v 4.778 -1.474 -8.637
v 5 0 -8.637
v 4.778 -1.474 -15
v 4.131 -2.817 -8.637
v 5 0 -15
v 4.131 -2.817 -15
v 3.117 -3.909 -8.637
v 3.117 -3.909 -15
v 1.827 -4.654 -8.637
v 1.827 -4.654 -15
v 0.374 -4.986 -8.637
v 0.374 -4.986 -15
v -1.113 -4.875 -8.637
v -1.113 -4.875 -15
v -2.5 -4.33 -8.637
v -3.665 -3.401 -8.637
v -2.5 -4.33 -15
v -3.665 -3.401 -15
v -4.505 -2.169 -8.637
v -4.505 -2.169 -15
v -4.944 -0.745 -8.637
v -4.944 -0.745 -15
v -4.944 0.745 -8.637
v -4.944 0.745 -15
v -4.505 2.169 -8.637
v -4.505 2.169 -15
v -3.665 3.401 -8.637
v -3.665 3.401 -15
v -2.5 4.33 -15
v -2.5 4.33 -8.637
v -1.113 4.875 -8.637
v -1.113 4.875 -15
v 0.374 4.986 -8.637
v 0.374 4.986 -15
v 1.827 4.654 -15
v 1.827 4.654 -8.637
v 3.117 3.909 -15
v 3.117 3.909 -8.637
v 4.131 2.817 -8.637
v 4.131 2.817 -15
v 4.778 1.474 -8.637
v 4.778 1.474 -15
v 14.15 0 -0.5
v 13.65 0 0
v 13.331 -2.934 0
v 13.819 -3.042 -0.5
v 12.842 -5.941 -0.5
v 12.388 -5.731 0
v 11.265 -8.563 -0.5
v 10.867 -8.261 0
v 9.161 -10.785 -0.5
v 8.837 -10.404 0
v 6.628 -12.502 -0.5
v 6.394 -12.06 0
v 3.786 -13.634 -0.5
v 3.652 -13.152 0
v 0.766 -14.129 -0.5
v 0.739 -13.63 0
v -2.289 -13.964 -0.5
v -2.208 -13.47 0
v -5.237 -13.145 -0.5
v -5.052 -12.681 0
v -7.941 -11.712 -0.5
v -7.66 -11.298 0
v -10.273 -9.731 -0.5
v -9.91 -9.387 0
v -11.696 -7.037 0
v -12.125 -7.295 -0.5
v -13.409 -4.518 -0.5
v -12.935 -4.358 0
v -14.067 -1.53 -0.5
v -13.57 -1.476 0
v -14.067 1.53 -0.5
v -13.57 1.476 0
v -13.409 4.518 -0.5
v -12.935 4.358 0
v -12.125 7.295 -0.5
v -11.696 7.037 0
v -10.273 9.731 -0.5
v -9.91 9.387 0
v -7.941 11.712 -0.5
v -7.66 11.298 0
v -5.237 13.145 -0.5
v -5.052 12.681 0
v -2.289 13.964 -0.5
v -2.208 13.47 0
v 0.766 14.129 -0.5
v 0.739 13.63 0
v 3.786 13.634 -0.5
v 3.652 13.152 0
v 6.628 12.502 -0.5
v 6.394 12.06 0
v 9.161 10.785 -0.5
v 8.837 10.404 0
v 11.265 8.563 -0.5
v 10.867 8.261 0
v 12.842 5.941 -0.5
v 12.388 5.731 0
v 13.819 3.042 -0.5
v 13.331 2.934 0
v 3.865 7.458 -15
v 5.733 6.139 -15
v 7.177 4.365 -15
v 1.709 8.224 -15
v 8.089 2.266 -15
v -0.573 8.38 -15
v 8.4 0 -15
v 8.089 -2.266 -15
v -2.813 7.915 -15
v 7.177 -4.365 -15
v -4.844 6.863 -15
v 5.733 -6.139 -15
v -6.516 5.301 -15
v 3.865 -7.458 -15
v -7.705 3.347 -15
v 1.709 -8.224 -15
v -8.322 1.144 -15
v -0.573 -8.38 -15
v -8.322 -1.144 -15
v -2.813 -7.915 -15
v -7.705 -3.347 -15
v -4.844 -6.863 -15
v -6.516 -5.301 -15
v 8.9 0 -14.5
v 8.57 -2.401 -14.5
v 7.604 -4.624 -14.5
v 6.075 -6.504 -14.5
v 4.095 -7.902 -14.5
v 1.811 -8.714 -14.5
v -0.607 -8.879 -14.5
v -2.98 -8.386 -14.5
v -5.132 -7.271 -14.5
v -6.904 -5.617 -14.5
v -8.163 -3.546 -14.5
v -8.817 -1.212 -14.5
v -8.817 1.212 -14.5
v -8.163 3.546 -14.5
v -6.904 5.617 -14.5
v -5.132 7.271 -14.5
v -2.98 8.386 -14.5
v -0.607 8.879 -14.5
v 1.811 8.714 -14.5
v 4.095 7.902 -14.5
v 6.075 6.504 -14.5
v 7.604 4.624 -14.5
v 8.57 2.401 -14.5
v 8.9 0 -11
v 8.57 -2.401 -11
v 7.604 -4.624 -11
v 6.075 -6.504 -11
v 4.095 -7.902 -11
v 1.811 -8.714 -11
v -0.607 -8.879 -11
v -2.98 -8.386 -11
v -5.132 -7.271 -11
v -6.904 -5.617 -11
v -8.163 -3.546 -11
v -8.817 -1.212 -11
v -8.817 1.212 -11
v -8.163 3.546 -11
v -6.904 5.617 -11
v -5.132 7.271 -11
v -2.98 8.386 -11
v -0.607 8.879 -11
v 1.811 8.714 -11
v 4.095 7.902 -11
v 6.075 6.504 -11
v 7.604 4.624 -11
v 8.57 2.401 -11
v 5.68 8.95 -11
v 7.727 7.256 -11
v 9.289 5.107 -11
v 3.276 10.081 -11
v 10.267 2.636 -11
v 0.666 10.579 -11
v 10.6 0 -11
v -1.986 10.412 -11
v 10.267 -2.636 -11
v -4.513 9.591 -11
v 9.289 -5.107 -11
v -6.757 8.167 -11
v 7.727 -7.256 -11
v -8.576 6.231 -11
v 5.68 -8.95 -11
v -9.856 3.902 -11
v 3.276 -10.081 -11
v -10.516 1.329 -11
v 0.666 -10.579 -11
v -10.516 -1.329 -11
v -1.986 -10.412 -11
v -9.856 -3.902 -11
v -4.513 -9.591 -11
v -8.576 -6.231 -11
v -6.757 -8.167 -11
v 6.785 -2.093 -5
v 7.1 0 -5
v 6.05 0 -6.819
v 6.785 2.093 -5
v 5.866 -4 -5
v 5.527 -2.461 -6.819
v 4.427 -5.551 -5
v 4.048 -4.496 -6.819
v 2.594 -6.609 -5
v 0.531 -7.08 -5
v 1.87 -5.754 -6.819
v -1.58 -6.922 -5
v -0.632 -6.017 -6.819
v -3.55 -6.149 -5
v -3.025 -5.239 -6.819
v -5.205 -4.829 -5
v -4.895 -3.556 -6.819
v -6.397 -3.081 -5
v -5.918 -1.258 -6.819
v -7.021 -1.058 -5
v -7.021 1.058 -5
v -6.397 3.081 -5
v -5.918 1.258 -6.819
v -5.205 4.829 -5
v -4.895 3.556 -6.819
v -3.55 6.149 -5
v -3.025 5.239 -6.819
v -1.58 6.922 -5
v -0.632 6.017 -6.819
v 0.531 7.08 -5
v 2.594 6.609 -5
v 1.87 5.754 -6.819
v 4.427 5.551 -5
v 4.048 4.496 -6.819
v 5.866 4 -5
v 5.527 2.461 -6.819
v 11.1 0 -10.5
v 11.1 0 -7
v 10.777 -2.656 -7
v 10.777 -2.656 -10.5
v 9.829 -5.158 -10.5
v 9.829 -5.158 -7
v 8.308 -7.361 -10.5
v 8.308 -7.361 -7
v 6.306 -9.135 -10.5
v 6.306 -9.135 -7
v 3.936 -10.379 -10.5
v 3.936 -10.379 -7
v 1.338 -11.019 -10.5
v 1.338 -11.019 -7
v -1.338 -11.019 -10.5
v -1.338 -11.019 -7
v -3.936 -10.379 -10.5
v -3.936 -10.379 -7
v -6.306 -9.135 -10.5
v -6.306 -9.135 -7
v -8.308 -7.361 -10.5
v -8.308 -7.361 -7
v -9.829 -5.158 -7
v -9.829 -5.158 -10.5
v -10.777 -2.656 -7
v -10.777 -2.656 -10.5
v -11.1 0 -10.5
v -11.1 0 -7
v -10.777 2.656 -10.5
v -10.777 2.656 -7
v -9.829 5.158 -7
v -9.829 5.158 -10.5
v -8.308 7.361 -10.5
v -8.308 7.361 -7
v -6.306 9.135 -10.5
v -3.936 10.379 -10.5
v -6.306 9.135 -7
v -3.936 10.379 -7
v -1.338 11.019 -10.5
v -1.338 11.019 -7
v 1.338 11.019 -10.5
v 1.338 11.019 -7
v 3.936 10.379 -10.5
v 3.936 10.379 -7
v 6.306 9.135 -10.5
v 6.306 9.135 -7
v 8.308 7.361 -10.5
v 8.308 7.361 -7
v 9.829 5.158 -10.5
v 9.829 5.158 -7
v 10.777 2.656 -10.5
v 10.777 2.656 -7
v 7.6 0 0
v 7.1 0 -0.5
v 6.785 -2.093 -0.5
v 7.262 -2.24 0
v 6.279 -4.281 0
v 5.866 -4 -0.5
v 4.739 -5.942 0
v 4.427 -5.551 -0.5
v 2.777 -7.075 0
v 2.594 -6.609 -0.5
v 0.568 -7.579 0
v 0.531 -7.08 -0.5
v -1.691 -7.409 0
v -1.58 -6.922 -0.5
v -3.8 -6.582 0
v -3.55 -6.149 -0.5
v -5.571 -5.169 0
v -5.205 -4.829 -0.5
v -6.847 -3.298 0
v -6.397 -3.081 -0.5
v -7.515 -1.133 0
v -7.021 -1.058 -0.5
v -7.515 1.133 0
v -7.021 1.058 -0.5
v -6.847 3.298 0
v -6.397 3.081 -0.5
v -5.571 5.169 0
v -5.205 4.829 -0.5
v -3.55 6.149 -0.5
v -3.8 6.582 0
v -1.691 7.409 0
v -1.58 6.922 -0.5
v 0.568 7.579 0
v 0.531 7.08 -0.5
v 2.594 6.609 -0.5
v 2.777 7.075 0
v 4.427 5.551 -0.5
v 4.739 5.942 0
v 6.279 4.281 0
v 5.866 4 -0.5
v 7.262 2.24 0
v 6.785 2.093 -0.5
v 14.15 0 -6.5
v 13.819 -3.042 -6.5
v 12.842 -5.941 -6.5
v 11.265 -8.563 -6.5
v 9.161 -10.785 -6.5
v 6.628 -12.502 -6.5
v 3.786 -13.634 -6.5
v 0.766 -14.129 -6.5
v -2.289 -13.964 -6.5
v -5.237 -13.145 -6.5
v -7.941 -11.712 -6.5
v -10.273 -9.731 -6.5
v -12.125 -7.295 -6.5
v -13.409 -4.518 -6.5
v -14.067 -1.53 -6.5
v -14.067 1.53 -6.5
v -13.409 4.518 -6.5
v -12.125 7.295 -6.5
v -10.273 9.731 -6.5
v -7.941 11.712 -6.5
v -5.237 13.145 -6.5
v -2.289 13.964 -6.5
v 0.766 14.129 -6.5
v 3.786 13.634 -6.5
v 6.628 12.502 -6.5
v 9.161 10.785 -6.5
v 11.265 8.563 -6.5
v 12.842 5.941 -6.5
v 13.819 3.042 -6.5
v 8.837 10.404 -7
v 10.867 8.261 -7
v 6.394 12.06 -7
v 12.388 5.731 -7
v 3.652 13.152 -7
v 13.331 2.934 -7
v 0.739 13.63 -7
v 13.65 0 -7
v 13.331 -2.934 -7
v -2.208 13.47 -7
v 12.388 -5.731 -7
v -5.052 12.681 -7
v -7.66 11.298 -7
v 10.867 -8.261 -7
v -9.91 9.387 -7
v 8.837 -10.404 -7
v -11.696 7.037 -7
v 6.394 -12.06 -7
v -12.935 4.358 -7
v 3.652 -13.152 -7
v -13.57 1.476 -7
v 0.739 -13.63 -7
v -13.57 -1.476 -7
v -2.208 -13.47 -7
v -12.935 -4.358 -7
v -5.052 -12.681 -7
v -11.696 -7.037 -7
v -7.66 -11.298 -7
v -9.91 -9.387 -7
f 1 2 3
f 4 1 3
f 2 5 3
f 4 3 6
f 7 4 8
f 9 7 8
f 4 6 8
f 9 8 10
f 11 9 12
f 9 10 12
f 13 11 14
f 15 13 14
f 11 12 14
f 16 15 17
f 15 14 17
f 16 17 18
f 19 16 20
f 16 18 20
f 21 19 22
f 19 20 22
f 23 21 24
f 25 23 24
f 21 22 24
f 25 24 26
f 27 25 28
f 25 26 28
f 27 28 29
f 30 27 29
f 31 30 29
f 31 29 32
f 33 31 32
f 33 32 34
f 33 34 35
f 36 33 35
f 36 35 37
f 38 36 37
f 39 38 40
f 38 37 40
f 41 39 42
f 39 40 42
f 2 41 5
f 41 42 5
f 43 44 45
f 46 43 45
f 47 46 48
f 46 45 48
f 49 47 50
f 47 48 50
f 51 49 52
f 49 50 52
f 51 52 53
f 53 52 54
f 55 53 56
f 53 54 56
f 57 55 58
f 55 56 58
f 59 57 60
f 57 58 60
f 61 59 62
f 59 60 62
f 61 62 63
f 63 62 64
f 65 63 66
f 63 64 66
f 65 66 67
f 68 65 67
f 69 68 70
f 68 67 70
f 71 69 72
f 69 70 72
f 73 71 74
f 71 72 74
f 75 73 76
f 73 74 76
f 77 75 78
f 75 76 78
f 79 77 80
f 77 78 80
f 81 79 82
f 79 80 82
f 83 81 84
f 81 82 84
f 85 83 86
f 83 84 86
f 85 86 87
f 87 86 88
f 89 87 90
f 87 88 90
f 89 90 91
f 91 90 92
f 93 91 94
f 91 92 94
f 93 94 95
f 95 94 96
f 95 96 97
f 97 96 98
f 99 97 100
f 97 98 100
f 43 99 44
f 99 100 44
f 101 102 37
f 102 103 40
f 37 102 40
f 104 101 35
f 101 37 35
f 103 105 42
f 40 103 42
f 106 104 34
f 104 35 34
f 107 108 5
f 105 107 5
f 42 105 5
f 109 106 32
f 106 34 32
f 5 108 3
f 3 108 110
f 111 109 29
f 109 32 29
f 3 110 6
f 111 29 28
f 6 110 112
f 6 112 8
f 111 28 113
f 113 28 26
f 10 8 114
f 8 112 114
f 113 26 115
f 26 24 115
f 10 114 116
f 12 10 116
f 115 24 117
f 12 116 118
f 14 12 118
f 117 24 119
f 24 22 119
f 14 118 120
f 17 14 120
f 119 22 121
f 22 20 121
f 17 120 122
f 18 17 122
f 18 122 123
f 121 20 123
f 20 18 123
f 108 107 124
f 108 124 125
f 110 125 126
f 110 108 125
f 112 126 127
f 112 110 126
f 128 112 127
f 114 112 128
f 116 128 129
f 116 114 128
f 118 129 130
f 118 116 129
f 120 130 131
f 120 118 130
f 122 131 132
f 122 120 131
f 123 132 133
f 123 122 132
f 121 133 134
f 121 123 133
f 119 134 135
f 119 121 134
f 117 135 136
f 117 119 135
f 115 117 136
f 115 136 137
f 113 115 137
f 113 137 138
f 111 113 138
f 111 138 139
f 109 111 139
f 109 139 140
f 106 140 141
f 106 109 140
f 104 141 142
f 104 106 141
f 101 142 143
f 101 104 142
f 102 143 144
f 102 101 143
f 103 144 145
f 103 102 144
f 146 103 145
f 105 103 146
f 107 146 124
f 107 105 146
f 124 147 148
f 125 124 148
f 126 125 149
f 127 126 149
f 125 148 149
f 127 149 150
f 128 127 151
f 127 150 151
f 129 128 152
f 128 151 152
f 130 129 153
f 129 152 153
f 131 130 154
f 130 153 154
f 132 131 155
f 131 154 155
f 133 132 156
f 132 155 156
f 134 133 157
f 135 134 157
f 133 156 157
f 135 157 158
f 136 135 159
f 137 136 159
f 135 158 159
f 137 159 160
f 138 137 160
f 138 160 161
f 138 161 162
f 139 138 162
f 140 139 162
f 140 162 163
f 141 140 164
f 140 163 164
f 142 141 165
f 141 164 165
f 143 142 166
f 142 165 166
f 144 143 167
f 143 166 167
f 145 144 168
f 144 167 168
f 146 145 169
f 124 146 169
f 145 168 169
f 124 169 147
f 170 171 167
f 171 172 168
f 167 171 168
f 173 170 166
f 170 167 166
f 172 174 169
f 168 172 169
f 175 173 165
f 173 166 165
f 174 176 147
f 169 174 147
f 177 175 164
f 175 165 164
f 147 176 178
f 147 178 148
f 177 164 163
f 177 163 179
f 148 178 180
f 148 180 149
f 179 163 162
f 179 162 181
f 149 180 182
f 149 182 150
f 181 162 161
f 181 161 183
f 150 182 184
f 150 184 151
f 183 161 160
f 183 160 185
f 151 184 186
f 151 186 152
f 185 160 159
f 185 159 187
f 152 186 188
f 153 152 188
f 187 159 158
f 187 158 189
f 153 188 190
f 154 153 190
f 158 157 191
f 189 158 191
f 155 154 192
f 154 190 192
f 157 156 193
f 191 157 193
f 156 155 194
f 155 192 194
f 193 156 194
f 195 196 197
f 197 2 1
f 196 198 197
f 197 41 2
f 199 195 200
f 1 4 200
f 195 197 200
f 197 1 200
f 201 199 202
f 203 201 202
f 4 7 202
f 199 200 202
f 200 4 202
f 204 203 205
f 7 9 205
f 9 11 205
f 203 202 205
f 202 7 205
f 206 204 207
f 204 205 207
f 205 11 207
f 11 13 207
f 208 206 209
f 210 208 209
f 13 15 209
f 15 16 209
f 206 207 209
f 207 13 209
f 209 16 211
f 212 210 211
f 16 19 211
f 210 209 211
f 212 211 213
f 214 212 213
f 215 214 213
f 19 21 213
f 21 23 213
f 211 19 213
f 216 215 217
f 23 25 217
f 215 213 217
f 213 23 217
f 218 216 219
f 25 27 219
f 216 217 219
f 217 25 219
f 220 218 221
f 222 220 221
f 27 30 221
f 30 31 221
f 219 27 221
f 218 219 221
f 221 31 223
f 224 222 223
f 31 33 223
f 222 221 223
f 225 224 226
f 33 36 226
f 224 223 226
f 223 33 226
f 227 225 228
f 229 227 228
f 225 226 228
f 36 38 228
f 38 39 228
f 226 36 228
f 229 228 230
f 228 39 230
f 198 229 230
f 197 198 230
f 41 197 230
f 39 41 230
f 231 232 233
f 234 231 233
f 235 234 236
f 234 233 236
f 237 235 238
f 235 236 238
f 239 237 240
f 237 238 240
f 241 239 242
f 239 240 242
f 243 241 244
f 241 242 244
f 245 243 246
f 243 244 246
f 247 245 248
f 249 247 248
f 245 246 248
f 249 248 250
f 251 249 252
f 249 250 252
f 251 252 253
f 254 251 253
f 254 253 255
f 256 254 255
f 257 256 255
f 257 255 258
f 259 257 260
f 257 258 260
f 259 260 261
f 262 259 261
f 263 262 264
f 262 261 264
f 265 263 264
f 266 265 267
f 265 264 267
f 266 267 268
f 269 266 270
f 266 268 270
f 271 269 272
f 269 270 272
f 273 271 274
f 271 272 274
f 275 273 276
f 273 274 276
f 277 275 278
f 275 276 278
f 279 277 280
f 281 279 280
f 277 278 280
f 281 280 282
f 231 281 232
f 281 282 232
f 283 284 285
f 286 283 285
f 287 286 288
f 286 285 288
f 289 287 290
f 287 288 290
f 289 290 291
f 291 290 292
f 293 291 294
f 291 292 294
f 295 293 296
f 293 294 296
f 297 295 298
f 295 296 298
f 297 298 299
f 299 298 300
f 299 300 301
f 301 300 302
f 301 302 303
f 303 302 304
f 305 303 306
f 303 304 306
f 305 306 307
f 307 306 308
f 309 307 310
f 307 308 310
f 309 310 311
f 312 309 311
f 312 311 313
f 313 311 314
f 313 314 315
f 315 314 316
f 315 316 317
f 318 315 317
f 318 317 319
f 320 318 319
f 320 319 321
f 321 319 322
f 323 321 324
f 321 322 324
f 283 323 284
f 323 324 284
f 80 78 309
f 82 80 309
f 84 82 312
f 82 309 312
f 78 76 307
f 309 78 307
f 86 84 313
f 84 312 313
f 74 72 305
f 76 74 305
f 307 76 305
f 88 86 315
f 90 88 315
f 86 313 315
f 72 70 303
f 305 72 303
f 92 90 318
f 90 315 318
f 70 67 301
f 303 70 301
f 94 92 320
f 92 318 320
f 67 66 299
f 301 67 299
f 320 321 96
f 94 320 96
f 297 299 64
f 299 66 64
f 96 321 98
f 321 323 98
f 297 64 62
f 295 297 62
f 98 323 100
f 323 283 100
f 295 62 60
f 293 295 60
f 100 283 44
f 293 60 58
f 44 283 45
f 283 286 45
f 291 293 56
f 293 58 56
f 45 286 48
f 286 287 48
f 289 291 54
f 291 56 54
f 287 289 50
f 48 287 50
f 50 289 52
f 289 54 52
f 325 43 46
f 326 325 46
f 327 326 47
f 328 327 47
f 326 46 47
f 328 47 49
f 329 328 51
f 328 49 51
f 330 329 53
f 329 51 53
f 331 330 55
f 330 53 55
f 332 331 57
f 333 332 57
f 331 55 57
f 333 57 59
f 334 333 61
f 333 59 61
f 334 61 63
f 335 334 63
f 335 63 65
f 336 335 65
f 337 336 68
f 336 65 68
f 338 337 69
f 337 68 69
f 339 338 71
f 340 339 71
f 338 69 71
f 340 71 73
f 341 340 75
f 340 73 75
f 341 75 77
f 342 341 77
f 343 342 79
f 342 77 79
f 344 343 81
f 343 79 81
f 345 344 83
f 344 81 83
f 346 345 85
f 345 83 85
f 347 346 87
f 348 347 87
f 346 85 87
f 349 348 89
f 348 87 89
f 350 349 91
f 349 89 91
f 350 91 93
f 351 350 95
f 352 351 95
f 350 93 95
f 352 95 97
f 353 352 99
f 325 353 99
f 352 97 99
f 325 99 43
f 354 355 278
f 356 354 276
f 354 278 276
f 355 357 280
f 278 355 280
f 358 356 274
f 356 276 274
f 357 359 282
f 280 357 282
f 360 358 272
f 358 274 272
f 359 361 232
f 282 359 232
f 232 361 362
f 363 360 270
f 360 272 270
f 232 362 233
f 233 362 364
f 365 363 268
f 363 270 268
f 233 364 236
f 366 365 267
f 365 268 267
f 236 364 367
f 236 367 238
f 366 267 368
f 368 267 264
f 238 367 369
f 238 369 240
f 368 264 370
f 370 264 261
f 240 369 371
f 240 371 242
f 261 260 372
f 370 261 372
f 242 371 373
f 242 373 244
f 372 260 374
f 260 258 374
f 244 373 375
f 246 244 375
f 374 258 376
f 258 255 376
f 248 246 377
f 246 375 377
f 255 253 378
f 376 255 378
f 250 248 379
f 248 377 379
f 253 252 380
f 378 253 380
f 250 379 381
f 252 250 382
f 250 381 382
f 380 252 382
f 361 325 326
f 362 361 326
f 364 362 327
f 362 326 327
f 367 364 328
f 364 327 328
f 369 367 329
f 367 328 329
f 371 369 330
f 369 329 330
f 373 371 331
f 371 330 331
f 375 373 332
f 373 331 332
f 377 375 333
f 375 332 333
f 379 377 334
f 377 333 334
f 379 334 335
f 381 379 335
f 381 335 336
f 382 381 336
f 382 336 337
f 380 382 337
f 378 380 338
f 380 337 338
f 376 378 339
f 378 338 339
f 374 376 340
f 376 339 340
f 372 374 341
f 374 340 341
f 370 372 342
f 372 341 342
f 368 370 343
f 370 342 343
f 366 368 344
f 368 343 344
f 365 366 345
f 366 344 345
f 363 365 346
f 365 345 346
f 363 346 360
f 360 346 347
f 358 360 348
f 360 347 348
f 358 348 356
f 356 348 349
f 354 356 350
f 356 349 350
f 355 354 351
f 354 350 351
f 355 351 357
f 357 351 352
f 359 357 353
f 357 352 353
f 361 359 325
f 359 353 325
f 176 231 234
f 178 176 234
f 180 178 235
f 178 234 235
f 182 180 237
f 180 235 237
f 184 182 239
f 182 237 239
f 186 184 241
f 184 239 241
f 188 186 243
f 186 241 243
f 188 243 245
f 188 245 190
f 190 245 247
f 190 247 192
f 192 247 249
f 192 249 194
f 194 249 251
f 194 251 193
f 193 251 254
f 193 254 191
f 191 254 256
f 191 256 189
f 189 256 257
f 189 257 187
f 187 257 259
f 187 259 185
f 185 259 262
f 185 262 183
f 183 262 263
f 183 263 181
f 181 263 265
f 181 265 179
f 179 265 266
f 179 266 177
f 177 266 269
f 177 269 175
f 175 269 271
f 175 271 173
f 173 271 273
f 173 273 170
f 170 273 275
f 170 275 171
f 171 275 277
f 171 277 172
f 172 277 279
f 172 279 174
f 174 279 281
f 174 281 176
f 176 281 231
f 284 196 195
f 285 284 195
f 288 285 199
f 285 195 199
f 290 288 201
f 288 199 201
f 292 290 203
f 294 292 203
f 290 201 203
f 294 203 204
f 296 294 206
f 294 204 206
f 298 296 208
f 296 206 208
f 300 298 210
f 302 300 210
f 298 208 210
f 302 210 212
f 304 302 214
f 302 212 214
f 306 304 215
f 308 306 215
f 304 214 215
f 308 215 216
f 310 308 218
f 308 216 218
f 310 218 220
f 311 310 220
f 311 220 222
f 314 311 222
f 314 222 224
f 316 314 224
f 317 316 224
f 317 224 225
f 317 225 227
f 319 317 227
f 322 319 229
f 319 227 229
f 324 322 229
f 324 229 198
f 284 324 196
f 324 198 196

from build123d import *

# Parameters (mm, degrees)
CHAMFER1_SIZE = 0.5


with BuildPart() as part:
    # Sketch2 → Revolve1 (revolve)
    with BuildSketch(Plane(origin=(0, 0, 0), x_dir=(0, 0, -1), z_dir=(1, 0, 0)), mode=Mode.PRIVATE) as revolve1_sk:
        Polygon((15, 8.9), (11, 8.9), (11, 11.1), (7, 11.1), (7, 14.15), (0, 14.15), (0, 7.1), (5, 7.1), (8.637306696, 5), (15, 5), align=None)
    revolve(revolve1_sk.sketch.rotate(Axis((0, 0, 0), (0, 0, -1)), 90), axis=Axis((0, 0, 0), (0, 0, -1)))

    # Chamfer1
    chamfer1_edges = [part.edges().sort_by_distance(p)[0] for p in [
        (-14.15, 0, -7),
        (-11.1, 0, -11),
        (-8.9, 0, -15),
        (-7.1, 0, 0),
        (-14.15, 0, 0),
    ]]
    chamfer(chamfer1_edges, length=CHAMFER1_SIZE)


solid = part.part
